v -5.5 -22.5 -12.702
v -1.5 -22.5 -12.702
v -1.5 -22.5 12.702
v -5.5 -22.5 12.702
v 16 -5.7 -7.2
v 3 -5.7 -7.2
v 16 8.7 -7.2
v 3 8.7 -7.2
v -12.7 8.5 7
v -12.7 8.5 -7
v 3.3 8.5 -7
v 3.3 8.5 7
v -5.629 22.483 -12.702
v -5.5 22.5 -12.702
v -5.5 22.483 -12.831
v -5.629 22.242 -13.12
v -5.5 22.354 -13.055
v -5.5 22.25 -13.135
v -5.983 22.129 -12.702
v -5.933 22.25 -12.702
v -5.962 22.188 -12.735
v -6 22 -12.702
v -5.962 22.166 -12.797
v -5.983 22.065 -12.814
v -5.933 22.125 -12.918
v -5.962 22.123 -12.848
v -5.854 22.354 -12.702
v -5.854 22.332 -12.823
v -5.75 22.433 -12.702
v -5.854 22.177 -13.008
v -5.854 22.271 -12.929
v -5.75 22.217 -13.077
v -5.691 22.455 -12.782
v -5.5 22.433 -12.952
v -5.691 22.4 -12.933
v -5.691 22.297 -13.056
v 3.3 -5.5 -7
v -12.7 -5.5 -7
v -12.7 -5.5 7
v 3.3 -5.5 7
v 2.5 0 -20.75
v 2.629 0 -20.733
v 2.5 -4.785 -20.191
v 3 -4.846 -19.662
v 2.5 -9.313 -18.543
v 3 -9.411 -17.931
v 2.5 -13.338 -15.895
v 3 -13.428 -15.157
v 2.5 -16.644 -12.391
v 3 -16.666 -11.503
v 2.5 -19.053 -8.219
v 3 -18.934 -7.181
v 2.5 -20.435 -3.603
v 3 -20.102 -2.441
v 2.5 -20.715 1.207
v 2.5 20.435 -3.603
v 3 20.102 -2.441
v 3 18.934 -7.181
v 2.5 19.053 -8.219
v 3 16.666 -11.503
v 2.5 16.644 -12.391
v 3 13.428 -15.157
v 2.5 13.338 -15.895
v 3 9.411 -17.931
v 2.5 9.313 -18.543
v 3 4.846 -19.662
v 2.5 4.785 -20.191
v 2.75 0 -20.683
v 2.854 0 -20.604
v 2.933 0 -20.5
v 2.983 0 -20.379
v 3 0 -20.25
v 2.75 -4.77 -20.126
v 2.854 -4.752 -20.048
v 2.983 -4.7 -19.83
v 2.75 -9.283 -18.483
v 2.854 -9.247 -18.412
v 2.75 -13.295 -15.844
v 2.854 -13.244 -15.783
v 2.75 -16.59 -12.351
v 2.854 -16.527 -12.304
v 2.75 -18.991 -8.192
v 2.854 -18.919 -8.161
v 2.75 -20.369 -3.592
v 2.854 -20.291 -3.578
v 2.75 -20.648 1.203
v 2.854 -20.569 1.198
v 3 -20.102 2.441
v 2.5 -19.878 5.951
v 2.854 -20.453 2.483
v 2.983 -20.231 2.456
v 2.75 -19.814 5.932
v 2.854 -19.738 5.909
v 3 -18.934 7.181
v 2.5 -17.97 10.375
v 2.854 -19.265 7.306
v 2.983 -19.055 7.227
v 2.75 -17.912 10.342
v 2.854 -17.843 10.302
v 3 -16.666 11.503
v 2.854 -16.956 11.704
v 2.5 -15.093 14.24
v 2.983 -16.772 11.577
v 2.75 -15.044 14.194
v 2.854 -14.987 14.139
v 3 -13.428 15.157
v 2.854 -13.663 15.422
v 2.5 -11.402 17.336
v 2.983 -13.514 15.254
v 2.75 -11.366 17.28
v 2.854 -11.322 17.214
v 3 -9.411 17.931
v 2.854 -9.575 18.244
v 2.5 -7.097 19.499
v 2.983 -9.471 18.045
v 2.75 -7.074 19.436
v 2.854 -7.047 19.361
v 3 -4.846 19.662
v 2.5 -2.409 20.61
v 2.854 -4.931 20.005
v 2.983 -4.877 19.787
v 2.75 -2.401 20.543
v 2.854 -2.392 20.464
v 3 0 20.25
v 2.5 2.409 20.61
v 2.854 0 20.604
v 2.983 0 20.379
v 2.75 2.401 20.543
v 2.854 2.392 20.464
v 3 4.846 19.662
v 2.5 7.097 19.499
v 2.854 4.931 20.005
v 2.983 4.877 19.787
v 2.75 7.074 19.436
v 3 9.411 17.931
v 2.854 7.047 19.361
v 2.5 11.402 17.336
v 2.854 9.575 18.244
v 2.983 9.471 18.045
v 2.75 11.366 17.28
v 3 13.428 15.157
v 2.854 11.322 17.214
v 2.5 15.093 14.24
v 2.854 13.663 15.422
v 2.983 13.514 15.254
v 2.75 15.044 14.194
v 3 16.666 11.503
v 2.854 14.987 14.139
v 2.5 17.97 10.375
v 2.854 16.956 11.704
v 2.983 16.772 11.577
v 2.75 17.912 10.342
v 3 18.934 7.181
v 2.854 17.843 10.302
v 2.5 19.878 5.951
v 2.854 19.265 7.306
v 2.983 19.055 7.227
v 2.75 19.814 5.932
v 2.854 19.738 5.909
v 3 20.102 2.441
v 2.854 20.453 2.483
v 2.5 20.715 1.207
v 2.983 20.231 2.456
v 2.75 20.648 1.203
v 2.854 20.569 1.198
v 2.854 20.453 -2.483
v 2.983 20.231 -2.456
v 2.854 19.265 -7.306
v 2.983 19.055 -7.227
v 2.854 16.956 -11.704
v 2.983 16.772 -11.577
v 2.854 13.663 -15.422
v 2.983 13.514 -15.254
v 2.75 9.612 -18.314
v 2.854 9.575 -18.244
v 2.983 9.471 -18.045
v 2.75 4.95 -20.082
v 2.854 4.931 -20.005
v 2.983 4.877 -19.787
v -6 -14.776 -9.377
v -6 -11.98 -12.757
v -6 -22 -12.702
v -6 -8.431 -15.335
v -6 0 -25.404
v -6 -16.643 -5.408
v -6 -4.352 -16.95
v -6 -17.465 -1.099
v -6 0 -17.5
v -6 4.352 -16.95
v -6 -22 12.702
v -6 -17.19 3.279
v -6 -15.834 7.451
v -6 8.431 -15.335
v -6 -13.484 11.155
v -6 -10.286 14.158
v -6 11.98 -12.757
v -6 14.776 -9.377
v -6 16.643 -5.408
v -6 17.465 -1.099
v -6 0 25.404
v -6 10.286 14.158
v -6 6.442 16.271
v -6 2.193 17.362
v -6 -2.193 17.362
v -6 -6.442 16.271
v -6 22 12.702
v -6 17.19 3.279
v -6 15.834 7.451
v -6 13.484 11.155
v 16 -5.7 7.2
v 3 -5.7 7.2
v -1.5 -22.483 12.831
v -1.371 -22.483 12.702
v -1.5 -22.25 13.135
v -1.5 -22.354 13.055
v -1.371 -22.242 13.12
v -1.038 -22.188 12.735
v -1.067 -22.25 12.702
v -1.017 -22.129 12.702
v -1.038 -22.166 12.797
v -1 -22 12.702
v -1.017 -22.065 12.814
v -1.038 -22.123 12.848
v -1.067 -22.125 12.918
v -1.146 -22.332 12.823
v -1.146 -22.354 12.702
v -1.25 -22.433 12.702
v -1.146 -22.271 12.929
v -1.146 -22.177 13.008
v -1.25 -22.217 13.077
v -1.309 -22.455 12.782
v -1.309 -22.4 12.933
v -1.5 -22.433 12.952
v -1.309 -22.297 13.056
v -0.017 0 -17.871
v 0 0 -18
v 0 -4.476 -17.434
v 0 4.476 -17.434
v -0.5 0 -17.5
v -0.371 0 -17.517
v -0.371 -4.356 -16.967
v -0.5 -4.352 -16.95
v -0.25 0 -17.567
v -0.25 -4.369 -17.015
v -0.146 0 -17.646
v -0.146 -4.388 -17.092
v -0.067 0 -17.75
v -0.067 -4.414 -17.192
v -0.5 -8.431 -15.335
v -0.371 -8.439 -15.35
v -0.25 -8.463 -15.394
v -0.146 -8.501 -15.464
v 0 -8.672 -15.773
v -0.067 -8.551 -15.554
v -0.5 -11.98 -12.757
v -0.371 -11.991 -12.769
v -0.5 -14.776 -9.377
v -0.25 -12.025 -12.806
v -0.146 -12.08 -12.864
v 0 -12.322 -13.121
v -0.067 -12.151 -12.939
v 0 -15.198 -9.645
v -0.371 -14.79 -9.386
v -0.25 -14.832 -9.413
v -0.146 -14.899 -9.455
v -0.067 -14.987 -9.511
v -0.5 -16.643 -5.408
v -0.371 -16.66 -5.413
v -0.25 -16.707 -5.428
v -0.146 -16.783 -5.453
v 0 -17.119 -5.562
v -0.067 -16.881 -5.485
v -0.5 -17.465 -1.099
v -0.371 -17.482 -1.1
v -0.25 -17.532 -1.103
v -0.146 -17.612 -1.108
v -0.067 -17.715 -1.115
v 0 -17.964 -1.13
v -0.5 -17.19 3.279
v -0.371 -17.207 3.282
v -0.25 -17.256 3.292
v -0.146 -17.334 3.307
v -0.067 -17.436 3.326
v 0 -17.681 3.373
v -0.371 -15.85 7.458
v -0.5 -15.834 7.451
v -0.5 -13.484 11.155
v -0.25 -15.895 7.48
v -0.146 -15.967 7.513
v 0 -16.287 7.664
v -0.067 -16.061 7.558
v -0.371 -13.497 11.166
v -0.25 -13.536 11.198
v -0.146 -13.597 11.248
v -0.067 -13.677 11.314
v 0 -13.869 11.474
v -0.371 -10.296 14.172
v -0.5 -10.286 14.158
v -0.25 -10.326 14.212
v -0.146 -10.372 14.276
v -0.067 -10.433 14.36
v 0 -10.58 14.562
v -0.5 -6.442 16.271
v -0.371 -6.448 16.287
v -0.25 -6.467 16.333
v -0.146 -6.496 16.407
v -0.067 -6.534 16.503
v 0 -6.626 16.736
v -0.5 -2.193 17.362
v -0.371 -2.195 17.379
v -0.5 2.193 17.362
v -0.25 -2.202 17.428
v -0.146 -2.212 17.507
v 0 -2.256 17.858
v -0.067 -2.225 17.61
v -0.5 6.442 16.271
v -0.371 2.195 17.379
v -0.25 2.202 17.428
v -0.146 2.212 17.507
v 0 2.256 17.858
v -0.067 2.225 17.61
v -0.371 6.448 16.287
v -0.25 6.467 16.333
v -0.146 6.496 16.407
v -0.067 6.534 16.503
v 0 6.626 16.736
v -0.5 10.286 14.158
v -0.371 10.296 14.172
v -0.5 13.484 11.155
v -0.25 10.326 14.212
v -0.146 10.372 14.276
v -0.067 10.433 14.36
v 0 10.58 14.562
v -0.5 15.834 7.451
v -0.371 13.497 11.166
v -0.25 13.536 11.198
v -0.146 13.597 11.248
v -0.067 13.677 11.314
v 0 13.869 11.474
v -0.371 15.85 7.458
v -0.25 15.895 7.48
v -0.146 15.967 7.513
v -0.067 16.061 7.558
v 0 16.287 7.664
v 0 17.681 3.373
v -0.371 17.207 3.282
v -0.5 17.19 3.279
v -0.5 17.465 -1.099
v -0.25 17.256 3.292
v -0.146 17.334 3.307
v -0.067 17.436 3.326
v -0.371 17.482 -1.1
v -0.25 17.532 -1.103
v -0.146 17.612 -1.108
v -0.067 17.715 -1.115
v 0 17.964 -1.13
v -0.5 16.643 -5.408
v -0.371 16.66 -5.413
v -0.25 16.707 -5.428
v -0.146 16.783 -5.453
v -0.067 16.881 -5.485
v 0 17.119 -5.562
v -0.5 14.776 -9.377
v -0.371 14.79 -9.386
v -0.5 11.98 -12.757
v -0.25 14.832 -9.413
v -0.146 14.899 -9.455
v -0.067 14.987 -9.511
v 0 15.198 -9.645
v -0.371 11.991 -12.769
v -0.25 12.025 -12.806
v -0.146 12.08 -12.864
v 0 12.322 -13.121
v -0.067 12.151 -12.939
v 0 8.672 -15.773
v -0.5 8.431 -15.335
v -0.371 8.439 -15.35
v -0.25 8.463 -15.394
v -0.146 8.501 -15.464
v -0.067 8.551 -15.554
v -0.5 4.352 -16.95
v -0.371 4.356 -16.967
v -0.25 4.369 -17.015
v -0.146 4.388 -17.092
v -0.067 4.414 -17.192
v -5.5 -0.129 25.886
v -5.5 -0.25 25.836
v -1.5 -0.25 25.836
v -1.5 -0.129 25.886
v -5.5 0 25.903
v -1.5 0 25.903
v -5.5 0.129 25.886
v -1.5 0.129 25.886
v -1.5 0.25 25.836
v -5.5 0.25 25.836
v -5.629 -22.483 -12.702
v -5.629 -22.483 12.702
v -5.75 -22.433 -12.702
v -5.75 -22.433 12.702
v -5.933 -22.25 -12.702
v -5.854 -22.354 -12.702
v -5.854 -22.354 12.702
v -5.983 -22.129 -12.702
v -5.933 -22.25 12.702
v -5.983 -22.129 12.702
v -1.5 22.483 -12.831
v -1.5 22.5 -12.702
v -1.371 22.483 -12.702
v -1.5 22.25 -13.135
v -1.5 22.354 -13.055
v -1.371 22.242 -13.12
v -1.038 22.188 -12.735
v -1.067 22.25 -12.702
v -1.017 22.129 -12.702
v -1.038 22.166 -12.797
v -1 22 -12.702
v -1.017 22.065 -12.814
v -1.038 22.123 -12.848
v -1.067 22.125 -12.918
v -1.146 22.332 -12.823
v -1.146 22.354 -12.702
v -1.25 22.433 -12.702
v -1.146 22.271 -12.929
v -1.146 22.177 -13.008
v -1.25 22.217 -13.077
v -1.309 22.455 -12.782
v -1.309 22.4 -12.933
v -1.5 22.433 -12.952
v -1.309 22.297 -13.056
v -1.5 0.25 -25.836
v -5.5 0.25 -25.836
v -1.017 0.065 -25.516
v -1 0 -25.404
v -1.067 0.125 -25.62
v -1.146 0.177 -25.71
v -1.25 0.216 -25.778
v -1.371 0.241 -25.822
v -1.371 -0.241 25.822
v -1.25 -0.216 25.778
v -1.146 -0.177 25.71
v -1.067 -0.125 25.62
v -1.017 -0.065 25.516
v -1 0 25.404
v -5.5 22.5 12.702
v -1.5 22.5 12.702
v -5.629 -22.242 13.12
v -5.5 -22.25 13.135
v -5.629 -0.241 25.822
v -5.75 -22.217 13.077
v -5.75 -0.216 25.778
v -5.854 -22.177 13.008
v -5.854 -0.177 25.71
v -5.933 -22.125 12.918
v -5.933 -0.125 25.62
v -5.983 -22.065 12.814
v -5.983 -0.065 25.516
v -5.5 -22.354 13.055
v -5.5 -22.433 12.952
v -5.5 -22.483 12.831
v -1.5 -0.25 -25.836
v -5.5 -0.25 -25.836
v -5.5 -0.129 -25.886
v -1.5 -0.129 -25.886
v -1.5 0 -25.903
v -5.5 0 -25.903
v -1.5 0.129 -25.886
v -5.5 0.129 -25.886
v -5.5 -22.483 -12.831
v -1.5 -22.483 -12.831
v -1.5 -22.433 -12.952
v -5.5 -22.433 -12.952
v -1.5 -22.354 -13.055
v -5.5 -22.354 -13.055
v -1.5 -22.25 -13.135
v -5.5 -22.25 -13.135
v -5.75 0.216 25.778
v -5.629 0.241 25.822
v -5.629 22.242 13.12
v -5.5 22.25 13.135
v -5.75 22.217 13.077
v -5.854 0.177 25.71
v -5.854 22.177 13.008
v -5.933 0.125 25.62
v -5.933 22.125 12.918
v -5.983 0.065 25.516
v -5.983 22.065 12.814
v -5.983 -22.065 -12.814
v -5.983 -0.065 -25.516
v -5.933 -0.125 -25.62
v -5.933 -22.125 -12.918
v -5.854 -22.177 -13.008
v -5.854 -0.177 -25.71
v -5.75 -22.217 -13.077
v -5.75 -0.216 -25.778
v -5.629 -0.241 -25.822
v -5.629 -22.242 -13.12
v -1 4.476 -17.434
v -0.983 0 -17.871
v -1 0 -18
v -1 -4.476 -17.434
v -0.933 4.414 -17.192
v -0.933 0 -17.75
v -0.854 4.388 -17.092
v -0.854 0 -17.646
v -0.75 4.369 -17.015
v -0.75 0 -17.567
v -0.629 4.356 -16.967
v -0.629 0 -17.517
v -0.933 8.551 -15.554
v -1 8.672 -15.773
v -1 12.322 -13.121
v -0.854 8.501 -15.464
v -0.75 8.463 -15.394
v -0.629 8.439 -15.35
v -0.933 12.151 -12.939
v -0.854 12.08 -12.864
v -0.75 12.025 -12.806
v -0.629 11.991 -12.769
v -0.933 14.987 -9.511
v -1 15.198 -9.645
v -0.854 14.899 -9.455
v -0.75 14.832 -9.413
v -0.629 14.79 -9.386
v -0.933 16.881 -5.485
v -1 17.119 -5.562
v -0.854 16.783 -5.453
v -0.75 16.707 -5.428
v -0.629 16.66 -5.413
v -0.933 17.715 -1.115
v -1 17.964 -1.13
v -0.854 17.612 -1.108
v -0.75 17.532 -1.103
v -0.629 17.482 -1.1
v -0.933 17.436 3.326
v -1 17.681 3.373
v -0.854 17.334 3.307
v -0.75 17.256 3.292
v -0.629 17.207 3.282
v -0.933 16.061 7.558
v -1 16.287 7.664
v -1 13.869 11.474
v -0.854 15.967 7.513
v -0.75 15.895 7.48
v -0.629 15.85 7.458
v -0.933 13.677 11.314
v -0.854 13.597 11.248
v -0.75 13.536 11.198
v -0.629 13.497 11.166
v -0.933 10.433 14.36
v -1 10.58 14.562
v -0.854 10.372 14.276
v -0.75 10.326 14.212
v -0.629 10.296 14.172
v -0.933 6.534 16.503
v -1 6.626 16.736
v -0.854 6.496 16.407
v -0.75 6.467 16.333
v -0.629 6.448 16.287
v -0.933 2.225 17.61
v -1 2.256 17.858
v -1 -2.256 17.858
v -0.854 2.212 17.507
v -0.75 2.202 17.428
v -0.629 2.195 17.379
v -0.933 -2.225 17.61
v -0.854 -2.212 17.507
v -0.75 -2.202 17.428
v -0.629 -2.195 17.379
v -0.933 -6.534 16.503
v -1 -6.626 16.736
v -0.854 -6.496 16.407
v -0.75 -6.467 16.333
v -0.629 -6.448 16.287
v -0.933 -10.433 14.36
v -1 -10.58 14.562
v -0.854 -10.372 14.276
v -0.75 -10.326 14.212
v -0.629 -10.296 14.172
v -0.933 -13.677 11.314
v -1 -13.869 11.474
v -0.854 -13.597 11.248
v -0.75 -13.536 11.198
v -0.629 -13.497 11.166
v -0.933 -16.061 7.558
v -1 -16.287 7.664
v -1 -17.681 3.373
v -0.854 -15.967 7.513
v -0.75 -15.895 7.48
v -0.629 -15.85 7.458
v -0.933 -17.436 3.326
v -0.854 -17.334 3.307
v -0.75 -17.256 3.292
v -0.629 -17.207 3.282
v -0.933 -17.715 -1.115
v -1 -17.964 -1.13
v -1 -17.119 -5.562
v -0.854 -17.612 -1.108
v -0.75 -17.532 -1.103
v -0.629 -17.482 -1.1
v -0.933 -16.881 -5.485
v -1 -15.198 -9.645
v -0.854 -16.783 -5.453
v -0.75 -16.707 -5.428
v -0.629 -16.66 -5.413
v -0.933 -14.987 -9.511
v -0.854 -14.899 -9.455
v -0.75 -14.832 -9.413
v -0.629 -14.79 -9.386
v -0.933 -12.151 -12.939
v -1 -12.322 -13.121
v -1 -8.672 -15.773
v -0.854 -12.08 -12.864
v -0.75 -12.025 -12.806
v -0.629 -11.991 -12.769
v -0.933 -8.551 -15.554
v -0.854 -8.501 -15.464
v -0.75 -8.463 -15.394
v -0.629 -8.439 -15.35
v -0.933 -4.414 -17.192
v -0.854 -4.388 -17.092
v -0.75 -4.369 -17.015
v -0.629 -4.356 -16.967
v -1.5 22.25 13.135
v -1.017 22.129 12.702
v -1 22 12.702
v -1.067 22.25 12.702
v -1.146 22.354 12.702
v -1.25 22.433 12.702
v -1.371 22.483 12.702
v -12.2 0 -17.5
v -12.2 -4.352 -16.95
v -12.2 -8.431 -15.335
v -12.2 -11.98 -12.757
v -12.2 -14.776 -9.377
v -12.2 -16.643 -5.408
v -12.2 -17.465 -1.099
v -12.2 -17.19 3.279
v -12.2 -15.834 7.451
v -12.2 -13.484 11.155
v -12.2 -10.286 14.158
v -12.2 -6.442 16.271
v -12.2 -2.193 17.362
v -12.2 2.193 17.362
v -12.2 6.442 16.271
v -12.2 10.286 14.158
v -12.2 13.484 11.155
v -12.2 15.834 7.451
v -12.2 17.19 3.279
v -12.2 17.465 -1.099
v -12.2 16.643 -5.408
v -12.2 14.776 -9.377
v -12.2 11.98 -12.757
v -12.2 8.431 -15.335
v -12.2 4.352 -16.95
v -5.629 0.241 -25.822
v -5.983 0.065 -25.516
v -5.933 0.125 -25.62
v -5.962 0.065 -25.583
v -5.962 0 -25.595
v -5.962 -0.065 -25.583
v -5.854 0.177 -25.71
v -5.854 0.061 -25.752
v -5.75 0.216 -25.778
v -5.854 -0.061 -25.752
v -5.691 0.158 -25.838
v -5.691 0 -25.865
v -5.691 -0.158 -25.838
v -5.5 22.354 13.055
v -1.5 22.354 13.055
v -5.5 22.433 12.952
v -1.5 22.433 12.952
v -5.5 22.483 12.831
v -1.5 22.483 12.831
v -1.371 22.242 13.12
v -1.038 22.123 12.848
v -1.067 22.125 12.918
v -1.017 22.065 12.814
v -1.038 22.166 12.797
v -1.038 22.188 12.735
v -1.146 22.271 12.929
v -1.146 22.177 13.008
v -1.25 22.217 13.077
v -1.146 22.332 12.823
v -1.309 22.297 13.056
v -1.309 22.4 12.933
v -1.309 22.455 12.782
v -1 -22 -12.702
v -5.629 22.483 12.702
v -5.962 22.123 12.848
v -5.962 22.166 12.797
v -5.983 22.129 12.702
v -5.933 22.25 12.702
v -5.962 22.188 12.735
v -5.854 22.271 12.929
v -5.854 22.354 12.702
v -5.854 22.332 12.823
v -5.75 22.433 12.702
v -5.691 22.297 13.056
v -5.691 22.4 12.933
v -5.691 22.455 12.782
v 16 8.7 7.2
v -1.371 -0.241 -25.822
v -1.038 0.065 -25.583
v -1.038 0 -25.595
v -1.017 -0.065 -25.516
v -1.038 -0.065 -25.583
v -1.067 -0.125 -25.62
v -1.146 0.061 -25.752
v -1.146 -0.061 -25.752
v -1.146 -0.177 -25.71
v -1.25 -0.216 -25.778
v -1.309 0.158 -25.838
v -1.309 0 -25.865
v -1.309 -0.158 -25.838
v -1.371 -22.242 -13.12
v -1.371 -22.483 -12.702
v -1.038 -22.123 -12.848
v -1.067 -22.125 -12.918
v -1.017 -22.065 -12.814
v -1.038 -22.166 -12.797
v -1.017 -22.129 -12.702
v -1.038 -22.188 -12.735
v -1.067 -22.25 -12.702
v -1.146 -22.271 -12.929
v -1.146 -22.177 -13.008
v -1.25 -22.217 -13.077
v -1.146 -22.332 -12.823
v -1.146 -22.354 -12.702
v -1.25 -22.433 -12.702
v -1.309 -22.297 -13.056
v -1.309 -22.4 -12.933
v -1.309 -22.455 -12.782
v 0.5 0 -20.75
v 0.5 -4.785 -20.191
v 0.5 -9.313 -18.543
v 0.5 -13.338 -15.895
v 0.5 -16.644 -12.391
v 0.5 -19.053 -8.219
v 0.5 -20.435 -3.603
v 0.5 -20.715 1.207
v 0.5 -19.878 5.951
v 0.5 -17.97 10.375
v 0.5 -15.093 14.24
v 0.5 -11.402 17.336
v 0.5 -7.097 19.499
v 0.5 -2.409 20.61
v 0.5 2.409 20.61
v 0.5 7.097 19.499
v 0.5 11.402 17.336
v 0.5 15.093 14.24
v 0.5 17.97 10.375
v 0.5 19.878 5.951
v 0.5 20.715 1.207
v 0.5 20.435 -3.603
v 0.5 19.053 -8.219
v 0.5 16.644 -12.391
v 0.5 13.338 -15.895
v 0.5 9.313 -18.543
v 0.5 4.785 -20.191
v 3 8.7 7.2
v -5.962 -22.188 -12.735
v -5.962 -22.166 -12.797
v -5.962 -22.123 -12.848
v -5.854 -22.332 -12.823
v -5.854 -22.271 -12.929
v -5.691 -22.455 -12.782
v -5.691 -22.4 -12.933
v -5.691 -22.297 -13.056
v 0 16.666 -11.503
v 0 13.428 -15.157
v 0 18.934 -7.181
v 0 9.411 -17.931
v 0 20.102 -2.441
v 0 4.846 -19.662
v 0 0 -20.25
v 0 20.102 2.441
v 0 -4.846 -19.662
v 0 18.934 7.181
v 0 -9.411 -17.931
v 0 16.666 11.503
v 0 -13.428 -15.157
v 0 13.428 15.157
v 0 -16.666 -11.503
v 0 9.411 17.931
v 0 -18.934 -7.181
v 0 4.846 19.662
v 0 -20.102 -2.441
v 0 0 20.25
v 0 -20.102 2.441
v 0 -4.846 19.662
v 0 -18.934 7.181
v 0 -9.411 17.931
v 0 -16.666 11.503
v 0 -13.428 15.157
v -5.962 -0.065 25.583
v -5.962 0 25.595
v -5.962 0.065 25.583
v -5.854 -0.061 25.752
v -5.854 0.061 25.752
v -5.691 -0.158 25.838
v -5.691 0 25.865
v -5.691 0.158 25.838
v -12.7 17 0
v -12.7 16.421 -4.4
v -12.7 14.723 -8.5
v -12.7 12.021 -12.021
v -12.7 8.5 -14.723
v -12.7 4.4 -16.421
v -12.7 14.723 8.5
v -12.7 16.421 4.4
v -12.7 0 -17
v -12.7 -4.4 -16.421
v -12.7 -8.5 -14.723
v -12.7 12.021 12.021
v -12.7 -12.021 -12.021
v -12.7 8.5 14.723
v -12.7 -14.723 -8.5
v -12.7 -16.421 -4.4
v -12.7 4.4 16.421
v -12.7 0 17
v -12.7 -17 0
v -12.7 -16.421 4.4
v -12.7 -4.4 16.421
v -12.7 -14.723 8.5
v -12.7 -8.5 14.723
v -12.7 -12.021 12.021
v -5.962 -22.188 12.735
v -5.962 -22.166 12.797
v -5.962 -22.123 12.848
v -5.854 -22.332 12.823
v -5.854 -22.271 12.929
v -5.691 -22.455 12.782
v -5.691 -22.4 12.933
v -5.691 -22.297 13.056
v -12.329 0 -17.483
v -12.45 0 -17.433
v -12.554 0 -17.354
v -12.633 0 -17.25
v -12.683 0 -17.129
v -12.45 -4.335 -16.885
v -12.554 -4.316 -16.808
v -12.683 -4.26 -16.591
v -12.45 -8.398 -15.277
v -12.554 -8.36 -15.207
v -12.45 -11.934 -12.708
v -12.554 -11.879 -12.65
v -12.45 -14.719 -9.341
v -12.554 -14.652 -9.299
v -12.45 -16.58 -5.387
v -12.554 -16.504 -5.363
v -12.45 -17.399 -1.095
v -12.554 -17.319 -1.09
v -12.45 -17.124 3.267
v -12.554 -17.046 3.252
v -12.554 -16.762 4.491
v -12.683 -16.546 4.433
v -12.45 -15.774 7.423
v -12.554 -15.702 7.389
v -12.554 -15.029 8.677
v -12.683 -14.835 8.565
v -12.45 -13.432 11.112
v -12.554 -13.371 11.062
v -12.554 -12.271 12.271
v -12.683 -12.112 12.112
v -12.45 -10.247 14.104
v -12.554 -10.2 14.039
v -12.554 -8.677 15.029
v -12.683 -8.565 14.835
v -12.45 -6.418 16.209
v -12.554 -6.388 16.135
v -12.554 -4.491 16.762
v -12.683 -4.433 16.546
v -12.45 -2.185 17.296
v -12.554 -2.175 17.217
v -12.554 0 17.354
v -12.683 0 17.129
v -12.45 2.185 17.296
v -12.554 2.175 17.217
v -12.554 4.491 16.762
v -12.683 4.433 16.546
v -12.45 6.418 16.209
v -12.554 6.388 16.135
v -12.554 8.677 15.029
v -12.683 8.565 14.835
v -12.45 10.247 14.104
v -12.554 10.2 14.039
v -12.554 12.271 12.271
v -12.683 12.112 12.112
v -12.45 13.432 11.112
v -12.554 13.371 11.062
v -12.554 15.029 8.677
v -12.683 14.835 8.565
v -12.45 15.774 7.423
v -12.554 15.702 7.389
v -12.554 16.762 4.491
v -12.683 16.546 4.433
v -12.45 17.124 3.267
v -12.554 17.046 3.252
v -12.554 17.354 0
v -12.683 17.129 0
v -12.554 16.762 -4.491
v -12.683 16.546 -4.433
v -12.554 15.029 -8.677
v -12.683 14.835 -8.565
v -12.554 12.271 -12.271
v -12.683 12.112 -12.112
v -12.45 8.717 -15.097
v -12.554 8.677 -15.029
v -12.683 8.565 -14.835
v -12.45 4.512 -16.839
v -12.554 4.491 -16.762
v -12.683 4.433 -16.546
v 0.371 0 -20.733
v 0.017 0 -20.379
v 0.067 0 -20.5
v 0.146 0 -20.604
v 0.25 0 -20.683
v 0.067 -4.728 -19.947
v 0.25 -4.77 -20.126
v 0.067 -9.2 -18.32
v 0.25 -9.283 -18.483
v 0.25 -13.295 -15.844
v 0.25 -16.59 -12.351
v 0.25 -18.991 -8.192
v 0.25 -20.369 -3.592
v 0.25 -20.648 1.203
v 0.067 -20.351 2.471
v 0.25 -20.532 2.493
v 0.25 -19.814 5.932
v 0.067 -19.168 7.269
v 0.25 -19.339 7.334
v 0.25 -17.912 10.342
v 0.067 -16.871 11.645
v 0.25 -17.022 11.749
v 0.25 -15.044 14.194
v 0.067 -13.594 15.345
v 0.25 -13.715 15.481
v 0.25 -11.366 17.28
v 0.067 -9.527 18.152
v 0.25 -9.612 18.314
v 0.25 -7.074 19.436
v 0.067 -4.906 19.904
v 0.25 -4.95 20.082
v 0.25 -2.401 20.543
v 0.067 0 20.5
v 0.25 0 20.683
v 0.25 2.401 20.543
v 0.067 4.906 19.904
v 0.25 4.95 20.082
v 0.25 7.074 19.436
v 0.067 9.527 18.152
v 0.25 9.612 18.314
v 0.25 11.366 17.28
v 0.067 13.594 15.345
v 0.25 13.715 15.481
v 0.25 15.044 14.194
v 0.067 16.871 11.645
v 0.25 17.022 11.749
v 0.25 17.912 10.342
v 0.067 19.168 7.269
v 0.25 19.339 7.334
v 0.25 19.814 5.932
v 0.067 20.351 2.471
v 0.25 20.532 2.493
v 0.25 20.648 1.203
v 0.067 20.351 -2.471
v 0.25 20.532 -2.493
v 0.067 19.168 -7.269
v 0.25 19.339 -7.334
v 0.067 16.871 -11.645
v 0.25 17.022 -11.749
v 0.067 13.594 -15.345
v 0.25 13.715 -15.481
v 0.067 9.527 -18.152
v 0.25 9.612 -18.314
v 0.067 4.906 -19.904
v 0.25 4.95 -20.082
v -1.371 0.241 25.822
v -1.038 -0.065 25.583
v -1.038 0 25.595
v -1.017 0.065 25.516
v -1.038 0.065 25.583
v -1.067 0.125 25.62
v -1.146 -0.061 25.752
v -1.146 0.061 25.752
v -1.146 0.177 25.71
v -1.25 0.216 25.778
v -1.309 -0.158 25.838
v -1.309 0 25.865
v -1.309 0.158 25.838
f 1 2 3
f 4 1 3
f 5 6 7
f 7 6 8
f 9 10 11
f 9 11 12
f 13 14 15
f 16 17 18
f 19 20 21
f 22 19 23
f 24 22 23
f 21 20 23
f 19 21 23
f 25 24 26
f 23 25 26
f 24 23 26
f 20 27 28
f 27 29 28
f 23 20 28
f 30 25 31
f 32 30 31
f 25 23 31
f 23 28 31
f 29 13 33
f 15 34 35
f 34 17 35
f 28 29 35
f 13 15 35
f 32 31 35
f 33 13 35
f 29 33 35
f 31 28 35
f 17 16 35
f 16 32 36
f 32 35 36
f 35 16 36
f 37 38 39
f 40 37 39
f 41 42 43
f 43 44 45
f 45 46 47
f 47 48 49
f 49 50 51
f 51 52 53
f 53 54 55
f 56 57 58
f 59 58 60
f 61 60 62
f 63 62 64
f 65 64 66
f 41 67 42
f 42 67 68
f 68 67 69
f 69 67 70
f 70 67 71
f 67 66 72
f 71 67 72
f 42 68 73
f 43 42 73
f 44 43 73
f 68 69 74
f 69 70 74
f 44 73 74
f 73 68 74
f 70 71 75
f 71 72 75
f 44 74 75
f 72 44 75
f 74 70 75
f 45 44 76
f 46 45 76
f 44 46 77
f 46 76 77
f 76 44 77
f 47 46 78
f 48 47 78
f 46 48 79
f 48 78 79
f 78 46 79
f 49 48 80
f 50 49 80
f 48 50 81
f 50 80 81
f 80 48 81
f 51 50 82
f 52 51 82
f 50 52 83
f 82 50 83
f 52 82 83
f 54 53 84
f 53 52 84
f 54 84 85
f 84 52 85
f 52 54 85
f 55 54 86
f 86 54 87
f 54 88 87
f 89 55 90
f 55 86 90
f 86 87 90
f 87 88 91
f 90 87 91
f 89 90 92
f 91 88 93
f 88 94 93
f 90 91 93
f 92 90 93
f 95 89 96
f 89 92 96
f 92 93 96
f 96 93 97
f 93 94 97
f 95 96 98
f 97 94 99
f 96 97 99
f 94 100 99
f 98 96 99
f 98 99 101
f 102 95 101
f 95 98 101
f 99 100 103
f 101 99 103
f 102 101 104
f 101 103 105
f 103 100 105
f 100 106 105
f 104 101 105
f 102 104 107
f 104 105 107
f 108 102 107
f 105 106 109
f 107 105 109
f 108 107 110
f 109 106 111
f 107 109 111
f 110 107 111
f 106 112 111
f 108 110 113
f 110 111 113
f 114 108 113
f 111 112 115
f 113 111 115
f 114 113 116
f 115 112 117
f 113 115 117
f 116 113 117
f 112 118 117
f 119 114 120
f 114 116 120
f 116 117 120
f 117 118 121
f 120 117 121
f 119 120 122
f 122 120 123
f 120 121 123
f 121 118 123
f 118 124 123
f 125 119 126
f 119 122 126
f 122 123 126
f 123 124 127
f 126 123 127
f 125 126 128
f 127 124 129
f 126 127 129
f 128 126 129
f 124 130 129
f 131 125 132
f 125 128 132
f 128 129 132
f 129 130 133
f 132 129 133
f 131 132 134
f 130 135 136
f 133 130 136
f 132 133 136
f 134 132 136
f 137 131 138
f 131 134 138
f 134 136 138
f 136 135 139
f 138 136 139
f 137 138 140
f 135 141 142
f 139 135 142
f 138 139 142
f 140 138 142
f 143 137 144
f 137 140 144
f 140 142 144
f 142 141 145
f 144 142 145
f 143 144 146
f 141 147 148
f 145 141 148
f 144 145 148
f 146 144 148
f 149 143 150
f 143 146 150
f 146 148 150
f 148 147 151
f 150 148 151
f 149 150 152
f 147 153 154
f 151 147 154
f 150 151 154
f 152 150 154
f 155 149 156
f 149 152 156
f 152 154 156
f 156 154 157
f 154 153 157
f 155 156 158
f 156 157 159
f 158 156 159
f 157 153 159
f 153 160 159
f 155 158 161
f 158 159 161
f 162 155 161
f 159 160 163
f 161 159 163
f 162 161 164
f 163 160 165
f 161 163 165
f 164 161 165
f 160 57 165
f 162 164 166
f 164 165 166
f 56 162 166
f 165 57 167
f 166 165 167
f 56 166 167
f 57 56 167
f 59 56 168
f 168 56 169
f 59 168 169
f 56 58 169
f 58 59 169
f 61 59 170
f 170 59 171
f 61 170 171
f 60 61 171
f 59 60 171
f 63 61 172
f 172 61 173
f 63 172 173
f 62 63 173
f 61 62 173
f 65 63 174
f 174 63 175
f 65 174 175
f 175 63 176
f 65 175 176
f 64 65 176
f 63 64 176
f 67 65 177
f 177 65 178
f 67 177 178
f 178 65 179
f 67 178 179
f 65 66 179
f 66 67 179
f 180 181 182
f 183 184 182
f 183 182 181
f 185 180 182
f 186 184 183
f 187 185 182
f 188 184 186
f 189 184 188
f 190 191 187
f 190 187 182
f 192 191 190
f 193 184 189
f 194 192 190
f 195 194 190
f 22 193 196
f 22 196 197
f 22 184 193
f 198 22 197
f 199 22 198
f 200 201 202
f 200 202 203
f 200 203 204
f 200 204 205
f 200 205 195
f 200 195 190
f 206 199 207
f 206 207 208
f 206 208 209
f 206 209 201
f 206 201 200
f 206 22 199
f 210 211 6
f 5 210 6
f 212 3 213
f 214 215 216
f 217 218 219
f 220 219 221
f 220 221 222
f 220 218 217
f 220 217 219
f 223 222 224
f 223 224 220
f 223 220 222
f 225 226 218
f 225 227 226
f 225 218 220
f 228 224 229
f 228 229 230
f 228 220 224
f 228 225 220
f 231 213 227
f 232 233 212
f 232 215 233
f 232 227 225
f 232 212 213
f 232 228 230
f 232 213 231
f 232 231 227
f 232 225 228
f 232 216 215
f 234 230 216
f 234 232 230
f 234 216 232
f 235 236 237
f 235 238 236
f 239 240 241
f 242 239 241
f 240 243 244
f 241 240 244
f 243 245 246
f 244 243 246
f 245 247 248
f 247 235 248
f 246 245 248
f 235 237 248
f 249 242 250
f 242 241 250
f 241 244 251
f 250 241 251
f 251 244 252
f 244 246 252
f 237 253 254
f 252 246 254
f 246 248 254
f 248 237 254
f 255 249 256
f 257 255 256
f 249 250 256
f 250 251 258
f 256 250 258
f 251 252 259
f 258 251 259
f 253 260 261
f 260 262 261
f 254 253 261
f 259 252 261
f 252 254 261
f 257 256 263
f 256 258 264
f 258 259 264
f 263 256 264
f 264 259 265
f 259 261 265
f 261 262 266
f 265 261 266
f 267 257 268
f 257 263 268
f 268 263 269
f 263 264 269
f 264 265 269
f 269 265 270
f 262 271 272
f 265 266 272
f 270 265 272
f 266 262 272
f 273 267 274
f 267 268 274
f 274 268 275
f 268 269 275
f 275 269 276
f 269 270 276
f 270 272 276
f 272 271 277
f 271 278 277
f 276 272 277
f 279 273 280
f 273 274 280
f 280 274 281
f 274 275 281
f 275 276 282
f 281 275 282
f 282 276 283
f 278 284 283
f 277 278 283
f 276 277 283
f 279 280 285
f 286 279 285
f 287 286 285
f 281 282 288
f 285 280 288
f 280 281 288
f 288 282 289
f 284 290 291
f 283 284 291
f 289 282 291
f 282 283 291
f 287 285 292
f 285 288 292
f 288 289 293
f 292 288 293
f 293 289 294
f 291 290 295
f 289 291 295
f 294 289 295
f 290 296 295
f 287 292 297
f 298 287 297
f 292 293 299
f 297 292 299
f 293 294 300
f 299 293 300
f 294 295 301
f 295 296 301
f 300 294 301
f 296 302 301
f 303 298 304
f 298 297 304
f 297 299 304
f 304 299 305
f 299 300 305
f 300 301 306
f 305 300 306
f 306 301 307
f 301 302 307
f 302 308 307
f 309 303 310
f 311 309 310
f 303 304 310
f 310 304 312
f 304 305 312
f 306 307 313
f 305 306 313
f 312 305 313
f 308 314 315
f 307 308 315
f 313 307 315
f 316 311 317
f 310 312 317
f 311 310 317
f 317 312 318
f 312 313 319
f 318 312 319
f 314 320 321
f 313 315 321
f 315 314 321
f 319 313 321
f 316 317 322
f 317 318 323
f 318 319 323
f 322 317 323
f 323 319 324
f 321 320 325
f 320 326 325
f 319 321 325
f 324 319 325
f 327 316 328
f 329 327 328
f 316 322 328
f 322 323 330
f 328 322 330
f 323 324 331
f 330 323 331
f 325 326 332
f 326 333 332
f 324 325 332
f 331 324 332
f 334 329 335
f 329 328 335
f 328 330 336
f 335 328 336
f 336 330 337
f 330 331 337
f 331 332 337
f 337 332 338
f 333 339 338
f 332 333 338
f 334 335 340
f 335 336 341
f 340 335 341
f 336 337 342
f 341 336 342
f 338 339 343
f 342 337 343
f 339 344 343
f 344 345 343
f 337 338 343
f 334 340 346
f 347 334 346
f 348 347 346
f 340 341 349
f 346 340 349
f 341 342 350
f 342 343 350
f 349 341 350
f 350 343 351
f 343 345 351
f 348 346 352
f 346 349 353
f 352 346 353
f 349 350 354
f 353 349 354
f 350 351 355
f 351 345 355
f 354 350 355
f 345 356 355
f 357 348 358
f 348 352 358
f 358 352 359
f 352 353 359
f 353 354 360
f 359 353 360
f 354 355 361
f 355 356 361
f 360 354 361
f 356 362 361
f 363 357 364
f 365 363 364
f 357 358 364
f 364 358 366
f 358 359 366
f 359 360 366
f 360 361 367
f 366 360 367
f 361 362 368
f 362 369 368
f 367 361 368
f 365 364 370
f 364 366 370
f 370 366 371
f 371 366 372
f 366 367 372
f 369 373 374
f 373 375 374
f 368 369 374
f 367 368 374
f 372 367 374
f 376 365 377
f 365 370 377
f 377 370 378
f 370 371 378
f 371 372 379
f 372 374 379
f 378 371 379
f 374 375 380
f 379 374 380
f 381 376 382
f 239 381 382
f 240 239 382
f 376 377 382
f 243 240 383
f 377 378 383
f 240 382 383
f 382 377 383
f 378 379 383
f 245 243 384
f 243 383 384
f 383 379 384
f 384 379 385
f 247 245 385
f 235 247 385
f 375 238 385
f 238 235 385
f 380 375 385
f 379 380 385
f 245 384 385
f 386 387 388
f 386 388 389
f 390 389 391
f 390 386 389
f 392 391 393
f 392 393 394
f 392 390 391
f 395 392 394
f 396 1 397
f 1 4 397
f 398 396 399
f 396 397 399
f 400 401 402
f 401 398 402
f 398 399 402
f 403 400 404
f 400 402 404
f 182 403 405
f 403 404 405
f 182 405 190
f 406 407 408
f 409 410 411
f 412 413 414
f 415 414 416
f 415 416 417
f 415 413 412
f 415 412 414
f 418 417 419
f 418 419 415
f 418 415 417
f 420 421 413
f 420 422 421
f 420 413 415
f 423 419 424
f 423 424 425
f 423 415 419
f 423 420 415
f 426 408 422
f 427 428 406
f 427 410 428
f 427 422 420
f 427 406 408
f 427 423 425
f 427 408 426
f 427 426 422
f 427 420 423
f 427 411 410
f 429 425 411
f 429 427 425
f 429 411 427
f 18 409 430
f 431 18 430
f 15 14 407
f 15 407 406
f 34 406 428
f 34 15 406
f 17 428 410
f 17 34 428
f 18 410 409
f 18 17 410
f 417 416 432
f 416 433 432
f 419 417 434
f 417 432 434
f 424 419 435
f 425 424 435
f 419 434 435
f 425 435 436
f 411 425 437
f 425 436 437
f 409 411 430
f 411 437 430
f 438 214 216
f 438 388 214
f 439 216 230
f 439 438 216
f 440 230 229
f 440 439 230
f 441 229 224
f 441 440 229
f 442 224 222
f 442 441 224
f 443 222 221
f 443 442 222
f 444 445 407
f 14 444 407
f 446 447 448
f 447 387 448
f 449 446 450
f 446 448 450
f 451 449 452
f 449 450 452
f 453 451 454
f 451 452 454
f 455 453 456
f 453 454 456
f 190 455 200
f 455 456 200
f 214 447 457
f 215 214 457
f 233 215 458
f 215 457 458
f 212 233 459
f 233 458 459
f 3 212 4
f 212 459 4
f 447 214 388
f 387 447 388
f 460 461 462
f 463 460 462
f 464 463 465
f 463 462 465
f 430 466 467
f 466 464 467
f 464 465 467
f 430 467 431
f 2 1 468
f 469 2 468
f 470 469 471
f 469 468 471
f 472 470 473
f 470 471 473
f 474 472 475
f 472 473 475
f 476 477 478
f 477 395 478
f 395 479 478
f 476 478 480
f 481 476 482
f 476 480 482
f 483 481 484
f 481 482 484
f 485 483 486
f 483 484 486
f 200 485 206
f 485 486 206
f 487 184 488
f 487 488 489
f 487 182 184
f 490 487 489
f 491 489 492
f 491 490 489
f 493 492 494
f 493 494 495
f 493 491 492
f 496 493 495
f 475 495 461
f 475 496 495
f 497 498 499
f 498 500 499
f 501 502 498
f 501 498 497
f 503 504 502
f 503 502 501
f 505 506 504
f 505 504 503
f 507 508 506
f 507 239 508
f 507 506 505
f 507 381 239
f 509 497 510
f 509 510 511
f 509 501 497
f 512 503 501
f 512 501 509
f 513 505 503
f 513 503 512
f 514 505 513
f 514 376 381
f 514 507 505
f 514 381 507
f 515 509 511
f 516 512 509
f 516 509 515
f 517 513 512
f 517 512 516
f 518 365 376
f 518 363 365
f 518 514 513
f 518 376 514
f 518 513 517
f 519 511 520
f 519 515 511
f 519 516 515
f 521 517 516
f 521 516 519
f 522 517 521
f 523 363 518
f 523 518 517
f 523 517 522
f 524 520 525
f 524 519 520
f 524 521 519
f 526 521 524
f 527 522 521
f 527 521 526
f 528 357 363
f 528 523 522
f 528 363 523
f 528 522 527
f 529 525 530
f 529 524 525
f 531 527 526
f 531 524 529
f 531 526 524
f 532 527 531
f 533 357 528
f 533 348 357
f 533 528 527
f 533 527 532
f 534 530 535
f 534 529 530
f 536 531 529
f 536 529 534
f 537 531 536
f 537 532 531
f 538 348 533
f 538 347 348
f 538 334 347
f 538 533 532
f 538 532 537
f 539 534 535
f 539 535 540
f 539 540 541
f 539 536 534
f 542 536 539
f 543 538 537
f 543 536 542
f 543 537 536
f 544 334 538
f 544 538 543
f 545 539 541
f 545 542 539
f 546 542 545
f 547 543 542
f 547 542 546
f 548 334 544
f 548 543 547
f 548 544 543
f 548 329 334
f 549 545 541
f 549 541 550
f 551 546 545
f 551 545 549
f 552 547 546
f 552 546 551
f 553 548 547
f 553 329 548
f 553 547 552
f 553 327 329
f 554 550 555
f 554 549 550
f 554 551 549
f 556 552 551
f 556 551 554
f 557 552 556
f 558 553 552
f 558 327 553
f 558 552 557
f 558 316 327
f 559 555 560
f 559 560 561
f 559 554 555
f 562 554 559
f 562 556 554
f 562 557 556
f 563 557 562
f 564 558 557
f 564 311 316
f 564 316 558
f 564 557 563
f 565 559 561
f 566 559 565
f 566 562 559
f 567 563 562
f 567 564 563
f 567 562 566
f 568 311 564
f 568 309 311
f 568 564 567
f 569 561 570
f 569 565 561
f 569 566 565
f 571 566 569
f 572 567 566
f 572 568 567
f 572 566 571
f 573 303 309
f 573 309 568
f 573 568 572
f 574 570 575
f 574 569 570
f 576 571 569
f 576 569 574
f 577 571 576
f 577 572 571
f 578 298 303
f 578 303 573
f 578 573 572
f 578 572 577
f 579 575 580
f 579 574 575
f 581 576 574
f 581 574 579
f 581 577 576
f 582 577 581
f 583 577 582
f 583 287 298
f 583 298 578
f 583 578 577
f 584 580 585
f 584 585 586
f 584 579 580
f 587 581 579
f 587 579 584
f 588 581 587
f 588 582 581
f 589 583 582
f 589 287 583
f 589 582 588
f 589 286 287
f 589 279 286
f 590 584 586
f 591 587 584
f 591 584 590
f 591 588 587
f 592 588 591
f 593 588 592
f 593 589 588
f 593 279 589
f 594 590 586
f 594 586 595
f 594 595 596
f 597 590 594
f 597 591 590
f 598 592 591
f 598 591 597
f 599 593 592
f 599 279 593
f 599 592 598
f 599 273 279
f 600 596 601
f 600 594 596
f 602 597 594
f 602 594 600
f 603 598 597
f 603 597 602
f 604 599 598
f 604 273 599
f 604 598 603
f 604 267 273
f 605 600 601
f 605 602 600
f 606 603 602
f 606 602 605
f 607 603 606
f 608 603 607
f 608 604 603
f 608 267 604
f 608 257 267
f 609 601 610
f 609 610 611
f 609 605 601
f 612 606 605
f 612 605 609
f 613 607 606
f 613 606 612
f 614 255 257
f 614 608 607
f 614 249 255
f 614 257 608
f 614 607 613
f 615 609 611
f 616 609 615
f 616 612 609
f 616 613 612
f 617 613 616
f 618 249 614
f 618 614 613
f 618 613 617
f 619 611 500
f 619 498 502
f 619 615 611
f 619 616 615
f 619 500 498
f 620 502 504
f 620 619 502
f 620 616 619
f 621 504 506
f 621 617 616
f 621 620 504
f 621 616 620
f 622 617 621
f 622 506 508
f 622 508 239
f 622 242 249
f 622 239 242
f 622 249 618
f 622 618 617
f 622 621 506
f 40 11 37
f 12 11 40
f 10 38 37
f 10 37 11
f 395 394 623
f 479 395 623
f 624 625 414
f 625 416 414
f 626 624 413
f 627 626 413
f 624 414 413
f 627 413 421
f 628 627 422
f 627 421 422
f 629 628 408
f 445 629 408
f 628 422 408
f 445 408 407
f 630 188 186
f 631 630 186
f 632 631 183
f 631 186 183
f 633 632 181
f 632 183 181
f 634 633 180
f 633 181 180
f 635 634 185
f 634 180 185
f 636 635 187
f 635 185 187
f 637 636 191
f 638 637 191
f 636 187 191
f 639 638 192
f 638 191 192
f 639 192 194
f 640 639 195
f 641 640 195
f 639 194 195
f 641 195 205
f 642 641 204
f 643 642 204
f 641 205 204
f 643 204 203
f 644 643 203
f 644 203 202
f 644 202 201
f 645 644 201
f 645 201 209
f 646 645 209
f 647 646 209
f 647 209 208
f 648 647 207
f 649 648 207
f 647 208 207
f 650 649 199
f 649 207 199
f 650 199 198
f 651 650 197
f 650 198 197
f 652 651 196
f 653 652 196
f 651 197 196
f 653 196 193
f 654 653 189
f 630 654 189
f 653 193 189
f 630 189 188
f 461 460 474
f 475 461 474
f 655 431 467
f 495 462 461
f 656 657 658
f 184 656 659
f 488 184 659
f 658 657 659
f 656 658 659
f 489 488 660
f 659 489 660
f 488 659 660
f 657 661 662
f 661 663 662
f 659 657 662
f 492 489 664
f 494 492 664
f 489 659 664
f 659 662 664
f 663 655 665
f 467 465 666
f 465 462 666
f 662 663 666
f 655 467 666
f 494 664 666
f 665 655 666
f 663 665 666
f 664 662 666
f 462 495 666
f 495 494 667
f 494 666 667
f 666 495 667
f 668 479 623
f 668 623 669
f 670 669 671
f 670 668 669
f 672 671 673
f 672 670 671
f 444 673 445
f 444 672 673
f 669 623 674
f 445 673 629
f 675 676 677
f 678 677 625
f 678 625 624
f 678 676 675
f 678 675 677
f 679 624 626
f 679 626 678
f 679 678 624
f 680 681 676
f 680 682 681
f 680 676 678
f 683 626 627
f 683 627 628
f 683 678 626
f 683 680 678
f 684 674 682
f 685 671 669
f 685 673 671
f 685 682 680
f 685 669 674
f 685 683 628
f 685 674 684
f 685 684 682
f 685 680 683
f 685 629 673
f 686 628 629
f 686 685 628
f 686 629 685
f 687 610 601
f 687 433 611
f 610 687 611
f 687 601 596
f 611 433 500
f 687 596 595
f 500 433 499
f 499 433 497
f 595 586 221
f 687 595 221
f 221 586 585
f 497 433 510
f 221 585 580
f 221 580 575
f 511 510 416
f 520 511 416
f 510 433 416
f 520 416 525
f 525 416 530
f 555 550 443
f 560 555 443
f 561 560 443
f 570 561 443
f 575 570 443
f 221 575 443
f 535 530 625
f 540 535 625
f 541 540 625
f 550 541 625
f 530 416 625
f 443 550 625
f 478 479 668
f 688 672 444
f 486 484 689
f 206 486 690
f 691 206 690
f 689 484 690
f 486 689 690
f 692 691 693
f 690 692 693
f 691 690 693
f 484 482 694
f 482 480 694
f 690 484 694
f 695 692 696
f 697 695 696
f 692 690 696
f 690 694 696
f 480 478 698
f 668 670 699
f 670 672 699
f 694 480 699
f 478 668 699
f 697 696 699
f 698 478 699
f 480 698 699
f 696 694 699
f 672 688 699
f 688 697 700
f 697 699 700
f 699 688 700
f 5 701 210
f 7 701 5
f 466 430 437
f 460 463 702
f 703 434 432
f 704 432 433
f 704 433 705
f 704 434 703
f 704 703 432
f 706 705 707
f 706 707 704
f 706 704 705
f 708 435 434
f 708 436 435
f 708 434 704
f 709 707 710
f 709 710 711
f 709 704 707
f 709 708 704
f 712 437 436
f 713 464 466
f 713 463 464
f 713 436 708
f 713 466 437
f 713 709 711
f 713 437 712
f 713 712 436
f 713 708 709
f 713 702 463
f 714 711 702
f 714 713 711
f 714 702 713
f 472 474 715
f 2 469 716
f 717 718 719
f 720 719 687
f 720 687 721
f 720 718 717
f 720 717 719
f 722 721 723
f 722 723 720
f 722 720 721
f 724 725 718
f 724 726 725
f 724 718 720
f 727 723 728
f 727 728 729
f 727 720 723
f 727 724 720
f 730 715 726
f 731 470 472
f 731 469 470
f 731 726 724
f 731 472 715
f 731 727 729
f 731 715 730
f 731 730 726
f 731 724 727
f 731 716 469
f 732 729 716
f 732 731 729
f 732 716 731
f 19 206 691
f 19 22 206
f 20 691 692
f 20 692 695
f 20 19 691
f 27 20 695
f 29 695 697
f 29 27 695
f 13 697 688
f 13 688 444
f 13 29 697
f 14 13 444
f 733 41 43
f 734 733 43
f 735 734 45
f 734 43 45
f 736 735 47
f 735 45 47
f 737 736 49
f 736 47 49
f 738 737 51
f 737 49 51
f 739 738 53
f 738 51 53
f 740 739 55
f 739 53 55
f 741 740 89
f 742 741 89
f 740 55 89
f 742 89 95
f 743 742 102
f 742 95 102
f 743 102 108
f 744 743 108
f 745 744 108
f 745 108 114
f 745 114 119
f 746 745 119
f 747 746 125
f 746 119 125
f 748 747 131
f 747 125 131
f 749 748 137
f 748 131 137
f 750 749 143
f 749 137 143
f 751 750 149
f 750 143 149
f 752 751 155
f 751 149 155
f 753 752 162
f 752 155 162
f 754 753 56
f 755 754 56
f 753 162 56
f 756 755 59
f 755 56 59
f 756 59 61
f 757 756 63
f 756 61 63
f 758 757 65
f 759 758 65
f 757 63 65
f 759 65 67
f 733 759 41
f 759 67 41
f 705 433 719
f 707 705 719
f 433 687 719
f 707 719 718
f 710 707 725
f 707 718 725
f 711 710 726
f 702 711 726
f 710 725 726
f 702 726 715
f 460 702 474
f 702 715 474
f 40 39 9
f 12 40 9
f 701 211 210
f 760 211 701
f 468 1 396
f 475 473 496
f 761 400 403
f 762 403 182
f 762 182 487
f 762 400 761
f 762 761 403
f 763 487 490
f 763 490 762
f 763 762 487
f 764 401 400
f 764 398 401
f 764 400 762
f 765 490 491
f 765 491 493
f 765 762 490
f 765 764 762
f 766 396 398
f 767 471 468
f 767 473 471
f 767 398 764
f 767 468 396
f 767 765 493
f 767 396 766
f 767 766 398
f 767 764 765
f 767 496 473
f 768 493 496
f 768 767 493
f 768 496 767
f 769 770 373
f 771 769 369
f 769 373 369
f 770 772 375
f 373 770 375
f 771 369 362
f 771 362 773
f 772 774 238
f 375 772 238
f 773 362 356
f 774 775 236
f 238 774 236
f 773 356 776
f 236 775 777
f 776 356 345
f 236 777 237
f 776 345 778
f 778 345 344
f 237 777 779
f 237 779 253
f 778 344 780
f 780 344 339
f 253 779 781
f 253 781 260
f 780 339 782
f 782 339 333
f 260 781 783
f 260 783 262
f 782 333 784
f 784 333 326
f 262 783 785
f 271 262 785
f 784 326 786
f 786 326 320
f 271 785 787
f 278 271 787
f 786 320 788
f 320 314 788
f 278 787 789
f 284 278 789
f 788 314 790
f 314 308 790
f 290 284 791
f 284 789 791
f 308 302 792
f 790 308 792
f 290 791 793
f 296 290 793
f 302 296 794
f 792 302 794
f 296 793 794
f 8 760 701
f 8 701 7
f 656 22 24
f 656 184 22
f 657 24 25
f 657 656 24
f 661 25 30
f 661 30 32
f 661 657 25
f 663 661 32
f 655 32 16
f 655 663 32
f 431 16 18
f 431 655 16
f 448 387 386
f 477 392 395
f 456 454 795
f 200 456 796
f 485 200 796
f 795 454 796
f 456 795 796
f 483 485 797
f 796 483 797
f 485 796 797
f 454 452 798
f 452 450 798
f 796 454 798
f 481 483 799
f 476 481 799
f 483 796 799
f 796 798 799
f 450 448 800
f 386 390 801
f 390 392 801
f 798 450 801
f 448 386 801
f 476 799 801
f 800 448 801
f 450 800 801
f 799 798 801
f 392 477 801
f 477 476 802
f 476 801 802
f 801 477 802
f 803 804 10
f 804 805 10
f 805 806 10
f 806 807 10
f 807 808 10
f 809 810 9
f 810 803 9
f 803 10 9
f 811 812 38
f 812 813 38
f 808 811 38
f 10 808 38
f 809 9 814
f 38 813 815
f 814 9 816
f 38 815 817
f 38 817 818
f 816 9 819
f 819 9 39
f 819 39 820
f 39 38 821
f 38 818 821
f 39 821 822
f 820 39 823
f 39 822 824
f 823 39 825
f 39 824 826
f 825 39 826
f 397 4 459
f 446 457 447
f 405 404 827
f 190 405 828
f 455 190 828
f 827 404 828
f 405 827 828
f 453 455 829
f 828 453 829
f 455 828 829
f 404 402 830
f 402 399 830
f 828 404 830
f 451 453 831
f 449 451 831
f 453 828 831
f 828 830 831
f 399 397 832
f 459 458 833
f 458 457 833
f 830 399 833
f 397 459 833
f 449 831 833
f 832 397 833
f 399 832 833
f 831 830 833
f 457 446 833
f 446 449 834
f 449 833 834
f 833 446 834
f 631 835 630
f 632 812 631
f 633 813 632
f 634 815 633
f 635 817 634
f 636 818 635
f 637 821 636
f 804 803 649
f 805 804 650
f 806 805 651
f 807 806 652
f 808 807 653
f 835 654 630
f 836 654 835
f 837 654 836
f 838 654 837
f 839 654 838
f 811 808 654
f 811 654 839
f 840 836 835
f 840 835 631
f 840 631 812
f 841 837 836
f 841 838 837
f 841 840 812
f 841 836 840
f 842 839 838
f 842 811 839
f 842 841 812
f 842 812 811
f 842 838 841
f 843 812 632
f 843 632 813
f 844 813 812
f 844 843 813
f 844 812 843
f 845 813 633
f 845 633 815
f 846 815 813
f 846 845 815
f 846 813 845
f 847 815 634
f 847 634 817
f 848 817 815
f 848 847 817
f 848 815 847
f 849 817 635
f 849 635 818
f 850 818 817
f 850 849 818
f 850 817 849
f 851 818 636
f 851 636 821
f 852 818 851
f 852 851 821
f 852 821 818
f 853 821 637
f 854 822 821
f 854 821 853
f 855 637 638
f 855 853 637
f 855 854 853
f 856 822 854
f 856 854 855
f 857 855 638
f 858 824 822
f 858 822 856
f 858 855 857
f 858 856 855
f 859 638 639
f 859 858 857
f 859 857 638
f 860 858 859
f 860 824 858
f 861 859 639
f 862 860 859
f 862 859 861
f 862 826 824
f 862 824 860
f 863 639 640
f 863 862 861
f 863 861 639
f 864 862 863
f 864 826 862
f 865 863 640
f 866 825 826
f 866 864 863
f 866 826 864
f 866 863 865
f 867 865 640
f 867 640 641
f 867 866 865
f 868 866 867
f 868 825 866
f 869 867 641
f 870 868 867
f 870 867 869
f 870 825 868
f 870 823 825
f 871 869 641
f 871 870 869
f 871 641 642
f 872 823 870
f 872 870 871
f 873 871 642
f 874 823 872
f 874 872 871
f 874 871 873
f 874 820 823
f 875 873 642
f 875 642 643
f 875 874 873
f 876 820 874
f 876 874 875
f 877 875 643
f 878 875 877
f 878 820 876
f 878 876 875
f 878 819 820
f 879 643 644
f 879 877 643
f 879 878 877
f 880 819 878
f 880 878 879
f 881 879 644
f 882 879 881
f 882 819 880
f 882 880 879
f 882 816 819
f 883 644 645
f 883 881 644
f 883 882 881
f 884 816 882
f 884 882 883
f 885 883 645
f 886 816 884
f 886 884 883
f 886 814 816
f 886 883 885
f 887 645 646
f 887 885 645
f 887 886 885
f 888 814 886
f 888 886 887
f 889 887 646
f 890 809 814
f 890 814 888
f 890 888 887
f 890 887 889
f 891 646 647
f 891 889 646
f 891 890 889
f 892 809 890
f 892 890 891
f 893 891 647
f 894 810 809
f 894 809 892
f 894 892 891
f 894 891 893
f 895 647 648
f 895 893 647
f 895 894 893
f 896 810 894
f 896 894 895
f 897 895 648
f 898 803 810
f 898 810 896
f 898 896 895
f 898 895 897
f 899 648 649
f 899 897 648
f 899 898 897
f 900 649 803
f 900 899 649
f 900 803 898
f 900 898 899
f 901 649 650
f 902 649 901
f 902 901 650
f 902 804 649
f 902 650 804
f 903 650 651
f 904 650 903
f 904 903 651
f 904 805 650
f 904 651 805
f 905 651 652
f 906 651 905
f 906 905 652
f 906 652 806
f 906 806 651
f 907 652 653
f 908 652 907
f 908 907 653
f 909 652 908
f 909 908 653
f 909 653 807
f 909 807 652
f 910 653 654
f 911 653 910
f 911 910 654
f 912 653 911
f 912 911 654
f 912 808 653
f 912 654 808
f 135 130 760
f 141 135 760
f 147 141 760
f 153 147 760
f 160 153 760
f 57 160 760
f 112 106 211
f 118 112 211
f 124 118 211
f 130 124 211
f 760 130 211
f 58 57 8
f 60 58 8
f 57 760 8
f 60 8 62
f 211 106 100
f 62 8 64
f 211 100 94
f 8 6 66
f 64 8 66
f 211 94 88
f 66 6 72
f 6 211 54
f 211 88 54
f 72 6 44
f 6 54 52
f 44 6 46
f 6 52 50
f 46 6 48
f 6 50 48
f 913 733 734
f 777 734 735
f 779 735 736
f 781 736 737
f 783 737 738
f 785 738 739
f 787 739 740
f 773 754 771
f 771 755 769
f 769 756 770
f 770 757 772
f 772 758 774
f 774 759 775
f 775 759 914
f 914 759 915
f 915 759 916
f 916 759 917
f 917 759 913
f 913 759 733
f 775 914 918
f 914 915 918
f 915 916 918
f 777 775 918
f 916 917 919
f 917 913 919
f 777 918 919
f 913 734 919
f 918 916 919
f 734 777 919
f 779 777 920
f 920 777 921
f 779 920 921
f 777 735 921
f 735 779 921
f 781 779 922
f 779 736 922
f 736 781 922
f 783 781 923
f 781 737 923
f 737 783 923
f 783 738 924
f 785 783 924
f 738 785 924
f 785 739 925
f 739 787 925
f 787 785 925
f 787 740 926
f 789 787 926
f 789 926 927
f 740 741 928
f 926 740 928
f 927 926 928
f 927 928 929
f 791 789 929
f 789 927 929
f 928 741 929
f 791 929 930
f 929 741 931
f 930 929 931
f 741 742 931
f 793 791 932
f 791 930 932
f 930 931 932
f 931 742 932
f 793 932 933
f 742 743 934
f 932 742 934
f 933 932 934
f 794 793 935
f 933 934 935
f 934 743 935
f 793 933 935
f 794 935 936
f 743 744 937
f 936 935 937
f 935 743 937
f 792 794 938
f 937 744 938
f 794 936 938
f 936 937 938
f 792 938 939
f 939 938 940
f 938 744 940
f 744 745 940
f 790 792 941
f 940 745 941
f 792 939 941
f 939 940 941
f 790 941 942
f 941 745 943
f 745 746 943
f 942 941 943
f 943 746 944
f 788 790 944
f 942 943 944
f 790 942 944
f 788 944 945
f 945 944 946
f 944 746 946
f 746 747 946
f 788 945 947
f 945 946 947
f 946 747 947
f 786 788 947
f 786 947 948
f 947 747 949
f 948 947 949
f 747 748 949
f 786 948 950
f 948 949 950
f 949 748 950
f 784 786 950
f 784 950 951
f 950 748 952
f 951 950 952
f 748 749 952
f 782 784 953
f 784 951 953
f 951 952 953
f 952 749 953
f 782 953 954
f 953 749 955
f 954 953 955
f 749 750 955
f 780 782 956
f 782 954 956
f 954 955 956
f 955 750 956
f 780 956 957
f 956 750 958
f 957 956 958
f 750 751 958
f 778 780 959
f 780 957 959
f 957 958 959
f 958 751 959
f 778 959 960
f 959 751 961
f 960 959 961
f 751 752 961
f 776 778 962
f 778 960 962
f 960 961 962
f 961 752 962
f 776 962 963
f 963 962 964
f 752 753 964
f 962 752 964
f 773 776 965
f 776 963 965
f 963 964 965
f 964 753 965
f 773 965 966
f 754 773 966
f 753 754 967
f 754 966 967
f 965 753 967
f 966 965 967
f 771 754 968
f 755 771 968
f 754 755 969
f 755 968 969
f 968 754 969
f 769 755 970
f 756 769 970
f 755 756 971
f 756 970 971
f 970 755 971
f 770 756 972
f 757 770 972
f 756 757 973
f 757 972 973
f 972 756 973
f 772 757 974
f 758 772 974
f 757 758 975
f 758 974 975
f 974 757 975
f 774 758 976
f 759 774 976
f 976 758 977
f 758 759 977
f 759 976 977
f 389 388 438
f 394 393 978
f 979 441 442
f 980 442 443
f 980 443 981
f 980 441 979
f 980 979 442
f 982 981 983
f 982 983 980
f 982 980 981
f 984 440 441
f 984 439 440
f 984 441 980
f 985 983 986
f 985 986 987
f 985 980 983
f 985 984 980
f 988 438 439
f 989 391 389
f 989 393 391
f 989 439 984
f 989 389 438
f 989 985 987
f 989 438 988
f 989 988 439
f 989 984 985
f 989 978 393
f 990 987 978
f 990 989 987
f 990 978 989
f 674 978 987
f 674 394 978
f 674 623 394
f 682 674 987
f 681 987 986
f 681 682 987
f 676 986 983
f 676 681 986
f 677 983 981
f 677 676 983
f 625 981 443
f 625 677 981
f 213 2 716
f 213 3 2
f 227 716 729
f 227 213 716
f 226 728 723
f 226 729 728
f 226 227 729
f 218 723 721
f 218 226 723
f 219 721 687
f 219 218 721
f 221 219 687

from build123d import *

# Parameters (mm, degrees)
BOSS_EXTRU_1_START      = 1
BOSS_EXTRU_1_DEPTH      = 5
ESQUISSE3_W             = 14.4
ESQUISSE3_H             = 14.4
BOSS_EXTRU_2_DEPTH      = 13
CONG_1_R                = 0.5
ESQUISSE4_W             = 14
ESQUISSE4_H             = 14
ENL_V_MAT_EXTRU_1_DEPTH = 16


with BuildPart() as part:
    # Esquisse1 → Révolution1 (revolve)
    with BuildSketch(Plane.XY, mode=Mode.PRIVATE) as r_volution1_sk:
        Polygon((-12.7, 0), (-12.7, 17.5), (0, 17.5), (0, 20.75), (3, 20.75), (3, 0), align=None)
    revolve(r_volution1_sk.sketch.rotate(Axis((15.223048327, 0, 0), (-1, 0, 0)), 90), axis=Axis((15.223048327, 0, 0), (-1, 0, 0)))

    # Esquisse2 → Boss.-Extru.1 (add)
    with BuildSketch(Plane.ZY.offset(BOSS_EXTRU_1_START)):
        Polygon((12.990381057, -22.5), (25.980762114, 0), (12.990381057, 22.5), (-12.990381057, 22.5), (-25.980762114, 0), (-12.990381057, -22.5), align=None)
    extrude(amount=BOSS_EXTRU_1_DEPTH)

    # Esquisse3 → Boss.-Extru.2 (add)
    with BuildSketch(Plane(origin=(3, 0, 0), x_dir=(0, 0, -1), z_dir=(1, 0, 0))):
        with Locations((0, 1.5)):
            Rectangle(ESQUISSE3_W, ESQUISSE3_H)
    extrude(amount=BOSS_EXTRU_2_DEPTH)

    # Congé1
    cong_1_edges = [part.edges().sort_by_distance(p)[0] for p in [
        (-1, 0, 17.5),
        (-1, -22.5, 0),
        (-3.5, -22.5, -12.990381057),
        (-1, -11.25, 19.485571585),
        (-3.5, -22.5, 12.990381057),
        (-1, 11.25, 19.485571585),
        (-3.5, 0, 25.980762114),
        (-1, 22.5, 0),
        (-3.5, 22.5, 12.990381057),
        (-1, 11.25, -19.485571585),
        (-3.5, 22.5, -12.990381057),
        (-1, -11.25, -19.485571585),
        (-3.5, 0, -25.980762114),
        (-6, -22.5, 0),
        (-6, -11.25, 19.485571585),
        (-6, 11.25, 19.485571585),
        (-6, 22.5, 0),
        (-6, 11.25, -19.485571585),
        (-6, -11.25, -19.485571585),
        (3, 0, 20.75),
        (0, 0, 20.75),
        (0, 0, 17.5),
        (-12.7, 0, 17.5),
    ]]
    fillet(cong_1_edges, radius=CONG_1_R - 0.0001)  # a hair under: the kernel refuses the full size

    # Esquisse4 → Enlèv. mat.-Extru.1 (cut)
    with BuildSketch(Plane.ZY.offset(12.7)):
        with Locations((0, 1.5)):
            Rectangle(ESQUISSE4_W, ESQUISSE4_H)
    extrude(amount=-ENL_V_MAT_EXTRU_1_DEPTH, mode=Mode.SUBTRACT)


solid = part.part
